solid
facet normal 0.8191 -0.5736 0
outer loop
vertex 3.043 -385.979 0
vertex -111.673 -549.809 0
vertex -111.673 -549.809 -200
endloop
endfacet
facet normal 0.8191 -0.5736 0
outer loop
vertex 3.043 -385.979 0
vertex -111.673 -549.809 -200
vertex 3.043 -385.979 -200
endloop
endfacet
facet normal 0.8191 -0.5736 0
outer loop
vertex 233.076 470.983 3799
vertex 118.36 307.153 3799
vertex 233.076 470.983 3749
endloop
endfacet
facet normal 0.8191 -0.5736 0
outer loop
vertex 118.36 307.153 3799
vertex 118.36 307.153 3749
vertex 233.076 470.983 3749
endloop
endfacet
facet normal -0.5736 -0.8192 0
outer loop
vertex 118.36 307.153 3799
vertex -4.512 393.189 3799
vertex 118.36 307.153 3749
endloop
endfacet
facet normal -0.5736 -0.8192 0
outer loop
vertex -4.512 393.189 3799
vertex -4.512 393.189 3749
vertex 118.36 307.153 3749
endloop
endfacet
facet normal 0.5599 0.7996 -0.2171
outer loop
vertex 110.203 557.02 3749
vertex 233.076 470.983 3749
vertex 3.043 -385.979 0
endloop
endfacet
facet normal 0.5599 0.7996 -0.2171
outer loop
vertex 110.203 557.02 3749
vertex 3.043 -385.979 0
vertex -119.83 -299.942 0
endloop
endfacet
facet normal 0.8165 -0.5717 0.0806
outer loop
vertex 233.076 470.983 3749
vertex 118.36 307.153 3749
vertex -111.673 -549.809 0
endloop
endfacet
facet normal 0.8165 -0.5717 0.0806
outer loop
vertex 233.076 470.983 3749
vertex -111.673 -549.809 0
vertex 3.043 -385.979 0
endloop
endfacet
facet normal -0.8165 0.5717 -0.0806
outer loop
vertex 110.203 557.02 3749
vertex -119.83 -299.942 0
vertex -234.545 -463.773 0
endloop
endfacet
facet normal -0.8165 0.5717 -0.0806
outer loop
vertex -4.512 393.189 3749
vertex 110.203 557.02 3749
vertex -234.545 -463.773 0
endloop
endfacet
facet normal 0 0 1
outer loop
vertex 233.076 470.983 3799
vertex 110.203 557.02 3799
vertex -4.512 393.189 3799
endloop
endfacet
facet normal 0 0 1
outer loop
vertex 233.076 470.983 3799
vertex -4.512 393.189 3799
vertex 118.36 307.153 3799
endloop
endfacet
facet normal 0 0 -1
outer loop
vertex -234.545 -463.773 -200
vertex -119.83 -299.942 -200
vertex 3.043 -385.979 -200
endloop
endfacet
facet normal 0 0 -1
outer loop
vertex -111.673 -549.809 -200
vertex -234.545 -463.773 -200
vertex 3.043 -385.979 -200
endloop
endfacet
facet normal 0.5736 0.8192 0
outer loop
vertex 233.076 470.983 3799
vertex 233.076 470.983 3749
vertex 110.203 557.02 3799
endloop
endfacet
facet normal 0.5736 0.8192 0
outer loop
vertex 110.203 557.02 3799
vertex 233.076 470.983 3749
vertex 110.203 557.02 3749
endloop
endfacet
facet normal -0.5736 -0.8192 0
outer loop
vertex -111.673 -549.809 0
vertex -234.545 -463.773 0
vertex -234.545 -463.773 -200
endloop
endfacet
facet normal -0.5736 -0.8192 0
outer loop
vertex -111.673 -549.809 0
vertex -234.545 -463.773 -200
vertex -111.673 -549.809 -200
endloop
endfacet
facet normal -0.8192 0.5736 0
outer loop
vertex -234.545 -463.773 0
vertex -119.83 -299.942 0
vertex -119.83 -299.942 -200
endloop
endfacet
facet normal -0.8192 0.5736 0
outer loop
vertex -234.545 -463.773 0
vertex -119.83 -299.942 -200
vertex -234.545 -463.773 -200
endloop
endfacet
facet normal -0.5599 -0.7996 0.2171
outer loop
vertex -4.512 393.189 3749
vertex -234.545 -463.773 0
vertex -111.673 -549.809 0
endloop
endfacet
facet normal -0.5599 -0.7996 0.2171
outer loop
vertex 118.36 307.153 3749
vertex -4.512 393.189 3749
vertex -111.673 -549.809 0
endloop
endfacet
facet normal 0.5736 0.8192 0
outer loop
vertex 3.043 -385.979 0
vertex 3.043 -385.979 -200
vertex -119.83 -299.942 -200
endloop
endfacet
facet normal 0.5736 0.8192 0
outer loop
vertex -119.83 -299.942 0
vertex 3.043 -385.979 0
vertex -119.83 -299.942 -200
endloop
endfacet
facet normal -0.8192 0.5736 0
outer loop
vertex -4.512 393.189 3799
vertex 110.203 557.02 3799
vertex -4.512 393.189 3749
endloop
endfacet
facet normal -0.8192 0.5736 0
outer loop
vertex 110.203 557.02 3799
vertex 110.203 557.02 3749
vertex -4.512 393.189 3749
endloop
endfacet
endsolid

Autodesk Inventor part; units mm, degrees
ref_plane "YZ Plane" through (0, 0, 0) normal (1, 0, 0) x (0, 1, 0)
ref_plane "XZ Plane" through (0, 0, 0) normal (0, 1, 0) x (-1, 0, 0)
sketch "Sketch1" plane through (0, 0, 0) normal (0, 0, 1) x (1, 0, 0)
  line L0 (-119.8302, -299.9423) -> (-234.5454, -463.7727)
  line L1 (3.0426, -385.9788) -> (-119.8302, -299.9423)
  line L2 (-111.6726, -549.8092) -> (3.0426, -385.9788)
  line L3 (-234.5454, -463.7727) -> (-111.6726, -549.8092)
  point P0 (0, 0)
ref_plane "Work Plane2" through (0, 0, 3749) normal (0, 0, 1) x (1, 0, 0)
ref_plane "Work Plane1" through (0, 0, 0) normal (0, 0, 1) x (1, 0, 0)
sketch "Sketch2" plane through (0, 0, 3749) normal (0, 0, 1) x (1, 0, 0)
  line L0 (110.2028, 557.0196) -> (-4.5125, 393.1892) projected
  line L1 (233.0756, 470.9832) -> (110.2028, 557.0196) projected
  line L2 (118.3603, 307.1528) -> (233.0756, 470.9832) projected
  line L3 (-4.5125, 393.1892) -> (118.3603, 307.1528) projected
  point P0 (0, 0)
loft "Loft1" add profiles "Sketch1", "Sketch2"
sketch "Sketch3" plane through (0, 0, 0) normal (0, 0, 1) x (1, 0, 0)
  line L0 (-119.8302, -299.9423) -> (-234.5454, -463.7727) projected
  line L1 (3.0426, -385.9788) -> (-119.8302, -299.9423) projected
  line L2 (-111.6726, -549.8092) -> (3.0426, -385.9788) projected
  line L3 (-234.5454, -463.7727) -> (-111.6726, -549.8092) projected
  point P0 (0, 0)
sketch "Sketch4" plane through (-4.5125, 393.1892, 3749) normal (0, 0, 1) x (0.8192, -0.5736, 0)
  line L0 (0, 200) -> (0, 0) projected
  line L1 (0, 0) -> (150, 0) projected
  line L2 (150, 0) -> (150, 200) projected
  line L3 (150, 200) -> (0, 200) projected
  point P0 (229.2205, -319.4935)
extrude "Extrusion1" add sketch "Sketch3" against normal blind 200
extrude "Extrusion2" add sketch "Sketch4" along normal blind 50
properties part number "support_beam_segment_0102" material "Wood Shake"
